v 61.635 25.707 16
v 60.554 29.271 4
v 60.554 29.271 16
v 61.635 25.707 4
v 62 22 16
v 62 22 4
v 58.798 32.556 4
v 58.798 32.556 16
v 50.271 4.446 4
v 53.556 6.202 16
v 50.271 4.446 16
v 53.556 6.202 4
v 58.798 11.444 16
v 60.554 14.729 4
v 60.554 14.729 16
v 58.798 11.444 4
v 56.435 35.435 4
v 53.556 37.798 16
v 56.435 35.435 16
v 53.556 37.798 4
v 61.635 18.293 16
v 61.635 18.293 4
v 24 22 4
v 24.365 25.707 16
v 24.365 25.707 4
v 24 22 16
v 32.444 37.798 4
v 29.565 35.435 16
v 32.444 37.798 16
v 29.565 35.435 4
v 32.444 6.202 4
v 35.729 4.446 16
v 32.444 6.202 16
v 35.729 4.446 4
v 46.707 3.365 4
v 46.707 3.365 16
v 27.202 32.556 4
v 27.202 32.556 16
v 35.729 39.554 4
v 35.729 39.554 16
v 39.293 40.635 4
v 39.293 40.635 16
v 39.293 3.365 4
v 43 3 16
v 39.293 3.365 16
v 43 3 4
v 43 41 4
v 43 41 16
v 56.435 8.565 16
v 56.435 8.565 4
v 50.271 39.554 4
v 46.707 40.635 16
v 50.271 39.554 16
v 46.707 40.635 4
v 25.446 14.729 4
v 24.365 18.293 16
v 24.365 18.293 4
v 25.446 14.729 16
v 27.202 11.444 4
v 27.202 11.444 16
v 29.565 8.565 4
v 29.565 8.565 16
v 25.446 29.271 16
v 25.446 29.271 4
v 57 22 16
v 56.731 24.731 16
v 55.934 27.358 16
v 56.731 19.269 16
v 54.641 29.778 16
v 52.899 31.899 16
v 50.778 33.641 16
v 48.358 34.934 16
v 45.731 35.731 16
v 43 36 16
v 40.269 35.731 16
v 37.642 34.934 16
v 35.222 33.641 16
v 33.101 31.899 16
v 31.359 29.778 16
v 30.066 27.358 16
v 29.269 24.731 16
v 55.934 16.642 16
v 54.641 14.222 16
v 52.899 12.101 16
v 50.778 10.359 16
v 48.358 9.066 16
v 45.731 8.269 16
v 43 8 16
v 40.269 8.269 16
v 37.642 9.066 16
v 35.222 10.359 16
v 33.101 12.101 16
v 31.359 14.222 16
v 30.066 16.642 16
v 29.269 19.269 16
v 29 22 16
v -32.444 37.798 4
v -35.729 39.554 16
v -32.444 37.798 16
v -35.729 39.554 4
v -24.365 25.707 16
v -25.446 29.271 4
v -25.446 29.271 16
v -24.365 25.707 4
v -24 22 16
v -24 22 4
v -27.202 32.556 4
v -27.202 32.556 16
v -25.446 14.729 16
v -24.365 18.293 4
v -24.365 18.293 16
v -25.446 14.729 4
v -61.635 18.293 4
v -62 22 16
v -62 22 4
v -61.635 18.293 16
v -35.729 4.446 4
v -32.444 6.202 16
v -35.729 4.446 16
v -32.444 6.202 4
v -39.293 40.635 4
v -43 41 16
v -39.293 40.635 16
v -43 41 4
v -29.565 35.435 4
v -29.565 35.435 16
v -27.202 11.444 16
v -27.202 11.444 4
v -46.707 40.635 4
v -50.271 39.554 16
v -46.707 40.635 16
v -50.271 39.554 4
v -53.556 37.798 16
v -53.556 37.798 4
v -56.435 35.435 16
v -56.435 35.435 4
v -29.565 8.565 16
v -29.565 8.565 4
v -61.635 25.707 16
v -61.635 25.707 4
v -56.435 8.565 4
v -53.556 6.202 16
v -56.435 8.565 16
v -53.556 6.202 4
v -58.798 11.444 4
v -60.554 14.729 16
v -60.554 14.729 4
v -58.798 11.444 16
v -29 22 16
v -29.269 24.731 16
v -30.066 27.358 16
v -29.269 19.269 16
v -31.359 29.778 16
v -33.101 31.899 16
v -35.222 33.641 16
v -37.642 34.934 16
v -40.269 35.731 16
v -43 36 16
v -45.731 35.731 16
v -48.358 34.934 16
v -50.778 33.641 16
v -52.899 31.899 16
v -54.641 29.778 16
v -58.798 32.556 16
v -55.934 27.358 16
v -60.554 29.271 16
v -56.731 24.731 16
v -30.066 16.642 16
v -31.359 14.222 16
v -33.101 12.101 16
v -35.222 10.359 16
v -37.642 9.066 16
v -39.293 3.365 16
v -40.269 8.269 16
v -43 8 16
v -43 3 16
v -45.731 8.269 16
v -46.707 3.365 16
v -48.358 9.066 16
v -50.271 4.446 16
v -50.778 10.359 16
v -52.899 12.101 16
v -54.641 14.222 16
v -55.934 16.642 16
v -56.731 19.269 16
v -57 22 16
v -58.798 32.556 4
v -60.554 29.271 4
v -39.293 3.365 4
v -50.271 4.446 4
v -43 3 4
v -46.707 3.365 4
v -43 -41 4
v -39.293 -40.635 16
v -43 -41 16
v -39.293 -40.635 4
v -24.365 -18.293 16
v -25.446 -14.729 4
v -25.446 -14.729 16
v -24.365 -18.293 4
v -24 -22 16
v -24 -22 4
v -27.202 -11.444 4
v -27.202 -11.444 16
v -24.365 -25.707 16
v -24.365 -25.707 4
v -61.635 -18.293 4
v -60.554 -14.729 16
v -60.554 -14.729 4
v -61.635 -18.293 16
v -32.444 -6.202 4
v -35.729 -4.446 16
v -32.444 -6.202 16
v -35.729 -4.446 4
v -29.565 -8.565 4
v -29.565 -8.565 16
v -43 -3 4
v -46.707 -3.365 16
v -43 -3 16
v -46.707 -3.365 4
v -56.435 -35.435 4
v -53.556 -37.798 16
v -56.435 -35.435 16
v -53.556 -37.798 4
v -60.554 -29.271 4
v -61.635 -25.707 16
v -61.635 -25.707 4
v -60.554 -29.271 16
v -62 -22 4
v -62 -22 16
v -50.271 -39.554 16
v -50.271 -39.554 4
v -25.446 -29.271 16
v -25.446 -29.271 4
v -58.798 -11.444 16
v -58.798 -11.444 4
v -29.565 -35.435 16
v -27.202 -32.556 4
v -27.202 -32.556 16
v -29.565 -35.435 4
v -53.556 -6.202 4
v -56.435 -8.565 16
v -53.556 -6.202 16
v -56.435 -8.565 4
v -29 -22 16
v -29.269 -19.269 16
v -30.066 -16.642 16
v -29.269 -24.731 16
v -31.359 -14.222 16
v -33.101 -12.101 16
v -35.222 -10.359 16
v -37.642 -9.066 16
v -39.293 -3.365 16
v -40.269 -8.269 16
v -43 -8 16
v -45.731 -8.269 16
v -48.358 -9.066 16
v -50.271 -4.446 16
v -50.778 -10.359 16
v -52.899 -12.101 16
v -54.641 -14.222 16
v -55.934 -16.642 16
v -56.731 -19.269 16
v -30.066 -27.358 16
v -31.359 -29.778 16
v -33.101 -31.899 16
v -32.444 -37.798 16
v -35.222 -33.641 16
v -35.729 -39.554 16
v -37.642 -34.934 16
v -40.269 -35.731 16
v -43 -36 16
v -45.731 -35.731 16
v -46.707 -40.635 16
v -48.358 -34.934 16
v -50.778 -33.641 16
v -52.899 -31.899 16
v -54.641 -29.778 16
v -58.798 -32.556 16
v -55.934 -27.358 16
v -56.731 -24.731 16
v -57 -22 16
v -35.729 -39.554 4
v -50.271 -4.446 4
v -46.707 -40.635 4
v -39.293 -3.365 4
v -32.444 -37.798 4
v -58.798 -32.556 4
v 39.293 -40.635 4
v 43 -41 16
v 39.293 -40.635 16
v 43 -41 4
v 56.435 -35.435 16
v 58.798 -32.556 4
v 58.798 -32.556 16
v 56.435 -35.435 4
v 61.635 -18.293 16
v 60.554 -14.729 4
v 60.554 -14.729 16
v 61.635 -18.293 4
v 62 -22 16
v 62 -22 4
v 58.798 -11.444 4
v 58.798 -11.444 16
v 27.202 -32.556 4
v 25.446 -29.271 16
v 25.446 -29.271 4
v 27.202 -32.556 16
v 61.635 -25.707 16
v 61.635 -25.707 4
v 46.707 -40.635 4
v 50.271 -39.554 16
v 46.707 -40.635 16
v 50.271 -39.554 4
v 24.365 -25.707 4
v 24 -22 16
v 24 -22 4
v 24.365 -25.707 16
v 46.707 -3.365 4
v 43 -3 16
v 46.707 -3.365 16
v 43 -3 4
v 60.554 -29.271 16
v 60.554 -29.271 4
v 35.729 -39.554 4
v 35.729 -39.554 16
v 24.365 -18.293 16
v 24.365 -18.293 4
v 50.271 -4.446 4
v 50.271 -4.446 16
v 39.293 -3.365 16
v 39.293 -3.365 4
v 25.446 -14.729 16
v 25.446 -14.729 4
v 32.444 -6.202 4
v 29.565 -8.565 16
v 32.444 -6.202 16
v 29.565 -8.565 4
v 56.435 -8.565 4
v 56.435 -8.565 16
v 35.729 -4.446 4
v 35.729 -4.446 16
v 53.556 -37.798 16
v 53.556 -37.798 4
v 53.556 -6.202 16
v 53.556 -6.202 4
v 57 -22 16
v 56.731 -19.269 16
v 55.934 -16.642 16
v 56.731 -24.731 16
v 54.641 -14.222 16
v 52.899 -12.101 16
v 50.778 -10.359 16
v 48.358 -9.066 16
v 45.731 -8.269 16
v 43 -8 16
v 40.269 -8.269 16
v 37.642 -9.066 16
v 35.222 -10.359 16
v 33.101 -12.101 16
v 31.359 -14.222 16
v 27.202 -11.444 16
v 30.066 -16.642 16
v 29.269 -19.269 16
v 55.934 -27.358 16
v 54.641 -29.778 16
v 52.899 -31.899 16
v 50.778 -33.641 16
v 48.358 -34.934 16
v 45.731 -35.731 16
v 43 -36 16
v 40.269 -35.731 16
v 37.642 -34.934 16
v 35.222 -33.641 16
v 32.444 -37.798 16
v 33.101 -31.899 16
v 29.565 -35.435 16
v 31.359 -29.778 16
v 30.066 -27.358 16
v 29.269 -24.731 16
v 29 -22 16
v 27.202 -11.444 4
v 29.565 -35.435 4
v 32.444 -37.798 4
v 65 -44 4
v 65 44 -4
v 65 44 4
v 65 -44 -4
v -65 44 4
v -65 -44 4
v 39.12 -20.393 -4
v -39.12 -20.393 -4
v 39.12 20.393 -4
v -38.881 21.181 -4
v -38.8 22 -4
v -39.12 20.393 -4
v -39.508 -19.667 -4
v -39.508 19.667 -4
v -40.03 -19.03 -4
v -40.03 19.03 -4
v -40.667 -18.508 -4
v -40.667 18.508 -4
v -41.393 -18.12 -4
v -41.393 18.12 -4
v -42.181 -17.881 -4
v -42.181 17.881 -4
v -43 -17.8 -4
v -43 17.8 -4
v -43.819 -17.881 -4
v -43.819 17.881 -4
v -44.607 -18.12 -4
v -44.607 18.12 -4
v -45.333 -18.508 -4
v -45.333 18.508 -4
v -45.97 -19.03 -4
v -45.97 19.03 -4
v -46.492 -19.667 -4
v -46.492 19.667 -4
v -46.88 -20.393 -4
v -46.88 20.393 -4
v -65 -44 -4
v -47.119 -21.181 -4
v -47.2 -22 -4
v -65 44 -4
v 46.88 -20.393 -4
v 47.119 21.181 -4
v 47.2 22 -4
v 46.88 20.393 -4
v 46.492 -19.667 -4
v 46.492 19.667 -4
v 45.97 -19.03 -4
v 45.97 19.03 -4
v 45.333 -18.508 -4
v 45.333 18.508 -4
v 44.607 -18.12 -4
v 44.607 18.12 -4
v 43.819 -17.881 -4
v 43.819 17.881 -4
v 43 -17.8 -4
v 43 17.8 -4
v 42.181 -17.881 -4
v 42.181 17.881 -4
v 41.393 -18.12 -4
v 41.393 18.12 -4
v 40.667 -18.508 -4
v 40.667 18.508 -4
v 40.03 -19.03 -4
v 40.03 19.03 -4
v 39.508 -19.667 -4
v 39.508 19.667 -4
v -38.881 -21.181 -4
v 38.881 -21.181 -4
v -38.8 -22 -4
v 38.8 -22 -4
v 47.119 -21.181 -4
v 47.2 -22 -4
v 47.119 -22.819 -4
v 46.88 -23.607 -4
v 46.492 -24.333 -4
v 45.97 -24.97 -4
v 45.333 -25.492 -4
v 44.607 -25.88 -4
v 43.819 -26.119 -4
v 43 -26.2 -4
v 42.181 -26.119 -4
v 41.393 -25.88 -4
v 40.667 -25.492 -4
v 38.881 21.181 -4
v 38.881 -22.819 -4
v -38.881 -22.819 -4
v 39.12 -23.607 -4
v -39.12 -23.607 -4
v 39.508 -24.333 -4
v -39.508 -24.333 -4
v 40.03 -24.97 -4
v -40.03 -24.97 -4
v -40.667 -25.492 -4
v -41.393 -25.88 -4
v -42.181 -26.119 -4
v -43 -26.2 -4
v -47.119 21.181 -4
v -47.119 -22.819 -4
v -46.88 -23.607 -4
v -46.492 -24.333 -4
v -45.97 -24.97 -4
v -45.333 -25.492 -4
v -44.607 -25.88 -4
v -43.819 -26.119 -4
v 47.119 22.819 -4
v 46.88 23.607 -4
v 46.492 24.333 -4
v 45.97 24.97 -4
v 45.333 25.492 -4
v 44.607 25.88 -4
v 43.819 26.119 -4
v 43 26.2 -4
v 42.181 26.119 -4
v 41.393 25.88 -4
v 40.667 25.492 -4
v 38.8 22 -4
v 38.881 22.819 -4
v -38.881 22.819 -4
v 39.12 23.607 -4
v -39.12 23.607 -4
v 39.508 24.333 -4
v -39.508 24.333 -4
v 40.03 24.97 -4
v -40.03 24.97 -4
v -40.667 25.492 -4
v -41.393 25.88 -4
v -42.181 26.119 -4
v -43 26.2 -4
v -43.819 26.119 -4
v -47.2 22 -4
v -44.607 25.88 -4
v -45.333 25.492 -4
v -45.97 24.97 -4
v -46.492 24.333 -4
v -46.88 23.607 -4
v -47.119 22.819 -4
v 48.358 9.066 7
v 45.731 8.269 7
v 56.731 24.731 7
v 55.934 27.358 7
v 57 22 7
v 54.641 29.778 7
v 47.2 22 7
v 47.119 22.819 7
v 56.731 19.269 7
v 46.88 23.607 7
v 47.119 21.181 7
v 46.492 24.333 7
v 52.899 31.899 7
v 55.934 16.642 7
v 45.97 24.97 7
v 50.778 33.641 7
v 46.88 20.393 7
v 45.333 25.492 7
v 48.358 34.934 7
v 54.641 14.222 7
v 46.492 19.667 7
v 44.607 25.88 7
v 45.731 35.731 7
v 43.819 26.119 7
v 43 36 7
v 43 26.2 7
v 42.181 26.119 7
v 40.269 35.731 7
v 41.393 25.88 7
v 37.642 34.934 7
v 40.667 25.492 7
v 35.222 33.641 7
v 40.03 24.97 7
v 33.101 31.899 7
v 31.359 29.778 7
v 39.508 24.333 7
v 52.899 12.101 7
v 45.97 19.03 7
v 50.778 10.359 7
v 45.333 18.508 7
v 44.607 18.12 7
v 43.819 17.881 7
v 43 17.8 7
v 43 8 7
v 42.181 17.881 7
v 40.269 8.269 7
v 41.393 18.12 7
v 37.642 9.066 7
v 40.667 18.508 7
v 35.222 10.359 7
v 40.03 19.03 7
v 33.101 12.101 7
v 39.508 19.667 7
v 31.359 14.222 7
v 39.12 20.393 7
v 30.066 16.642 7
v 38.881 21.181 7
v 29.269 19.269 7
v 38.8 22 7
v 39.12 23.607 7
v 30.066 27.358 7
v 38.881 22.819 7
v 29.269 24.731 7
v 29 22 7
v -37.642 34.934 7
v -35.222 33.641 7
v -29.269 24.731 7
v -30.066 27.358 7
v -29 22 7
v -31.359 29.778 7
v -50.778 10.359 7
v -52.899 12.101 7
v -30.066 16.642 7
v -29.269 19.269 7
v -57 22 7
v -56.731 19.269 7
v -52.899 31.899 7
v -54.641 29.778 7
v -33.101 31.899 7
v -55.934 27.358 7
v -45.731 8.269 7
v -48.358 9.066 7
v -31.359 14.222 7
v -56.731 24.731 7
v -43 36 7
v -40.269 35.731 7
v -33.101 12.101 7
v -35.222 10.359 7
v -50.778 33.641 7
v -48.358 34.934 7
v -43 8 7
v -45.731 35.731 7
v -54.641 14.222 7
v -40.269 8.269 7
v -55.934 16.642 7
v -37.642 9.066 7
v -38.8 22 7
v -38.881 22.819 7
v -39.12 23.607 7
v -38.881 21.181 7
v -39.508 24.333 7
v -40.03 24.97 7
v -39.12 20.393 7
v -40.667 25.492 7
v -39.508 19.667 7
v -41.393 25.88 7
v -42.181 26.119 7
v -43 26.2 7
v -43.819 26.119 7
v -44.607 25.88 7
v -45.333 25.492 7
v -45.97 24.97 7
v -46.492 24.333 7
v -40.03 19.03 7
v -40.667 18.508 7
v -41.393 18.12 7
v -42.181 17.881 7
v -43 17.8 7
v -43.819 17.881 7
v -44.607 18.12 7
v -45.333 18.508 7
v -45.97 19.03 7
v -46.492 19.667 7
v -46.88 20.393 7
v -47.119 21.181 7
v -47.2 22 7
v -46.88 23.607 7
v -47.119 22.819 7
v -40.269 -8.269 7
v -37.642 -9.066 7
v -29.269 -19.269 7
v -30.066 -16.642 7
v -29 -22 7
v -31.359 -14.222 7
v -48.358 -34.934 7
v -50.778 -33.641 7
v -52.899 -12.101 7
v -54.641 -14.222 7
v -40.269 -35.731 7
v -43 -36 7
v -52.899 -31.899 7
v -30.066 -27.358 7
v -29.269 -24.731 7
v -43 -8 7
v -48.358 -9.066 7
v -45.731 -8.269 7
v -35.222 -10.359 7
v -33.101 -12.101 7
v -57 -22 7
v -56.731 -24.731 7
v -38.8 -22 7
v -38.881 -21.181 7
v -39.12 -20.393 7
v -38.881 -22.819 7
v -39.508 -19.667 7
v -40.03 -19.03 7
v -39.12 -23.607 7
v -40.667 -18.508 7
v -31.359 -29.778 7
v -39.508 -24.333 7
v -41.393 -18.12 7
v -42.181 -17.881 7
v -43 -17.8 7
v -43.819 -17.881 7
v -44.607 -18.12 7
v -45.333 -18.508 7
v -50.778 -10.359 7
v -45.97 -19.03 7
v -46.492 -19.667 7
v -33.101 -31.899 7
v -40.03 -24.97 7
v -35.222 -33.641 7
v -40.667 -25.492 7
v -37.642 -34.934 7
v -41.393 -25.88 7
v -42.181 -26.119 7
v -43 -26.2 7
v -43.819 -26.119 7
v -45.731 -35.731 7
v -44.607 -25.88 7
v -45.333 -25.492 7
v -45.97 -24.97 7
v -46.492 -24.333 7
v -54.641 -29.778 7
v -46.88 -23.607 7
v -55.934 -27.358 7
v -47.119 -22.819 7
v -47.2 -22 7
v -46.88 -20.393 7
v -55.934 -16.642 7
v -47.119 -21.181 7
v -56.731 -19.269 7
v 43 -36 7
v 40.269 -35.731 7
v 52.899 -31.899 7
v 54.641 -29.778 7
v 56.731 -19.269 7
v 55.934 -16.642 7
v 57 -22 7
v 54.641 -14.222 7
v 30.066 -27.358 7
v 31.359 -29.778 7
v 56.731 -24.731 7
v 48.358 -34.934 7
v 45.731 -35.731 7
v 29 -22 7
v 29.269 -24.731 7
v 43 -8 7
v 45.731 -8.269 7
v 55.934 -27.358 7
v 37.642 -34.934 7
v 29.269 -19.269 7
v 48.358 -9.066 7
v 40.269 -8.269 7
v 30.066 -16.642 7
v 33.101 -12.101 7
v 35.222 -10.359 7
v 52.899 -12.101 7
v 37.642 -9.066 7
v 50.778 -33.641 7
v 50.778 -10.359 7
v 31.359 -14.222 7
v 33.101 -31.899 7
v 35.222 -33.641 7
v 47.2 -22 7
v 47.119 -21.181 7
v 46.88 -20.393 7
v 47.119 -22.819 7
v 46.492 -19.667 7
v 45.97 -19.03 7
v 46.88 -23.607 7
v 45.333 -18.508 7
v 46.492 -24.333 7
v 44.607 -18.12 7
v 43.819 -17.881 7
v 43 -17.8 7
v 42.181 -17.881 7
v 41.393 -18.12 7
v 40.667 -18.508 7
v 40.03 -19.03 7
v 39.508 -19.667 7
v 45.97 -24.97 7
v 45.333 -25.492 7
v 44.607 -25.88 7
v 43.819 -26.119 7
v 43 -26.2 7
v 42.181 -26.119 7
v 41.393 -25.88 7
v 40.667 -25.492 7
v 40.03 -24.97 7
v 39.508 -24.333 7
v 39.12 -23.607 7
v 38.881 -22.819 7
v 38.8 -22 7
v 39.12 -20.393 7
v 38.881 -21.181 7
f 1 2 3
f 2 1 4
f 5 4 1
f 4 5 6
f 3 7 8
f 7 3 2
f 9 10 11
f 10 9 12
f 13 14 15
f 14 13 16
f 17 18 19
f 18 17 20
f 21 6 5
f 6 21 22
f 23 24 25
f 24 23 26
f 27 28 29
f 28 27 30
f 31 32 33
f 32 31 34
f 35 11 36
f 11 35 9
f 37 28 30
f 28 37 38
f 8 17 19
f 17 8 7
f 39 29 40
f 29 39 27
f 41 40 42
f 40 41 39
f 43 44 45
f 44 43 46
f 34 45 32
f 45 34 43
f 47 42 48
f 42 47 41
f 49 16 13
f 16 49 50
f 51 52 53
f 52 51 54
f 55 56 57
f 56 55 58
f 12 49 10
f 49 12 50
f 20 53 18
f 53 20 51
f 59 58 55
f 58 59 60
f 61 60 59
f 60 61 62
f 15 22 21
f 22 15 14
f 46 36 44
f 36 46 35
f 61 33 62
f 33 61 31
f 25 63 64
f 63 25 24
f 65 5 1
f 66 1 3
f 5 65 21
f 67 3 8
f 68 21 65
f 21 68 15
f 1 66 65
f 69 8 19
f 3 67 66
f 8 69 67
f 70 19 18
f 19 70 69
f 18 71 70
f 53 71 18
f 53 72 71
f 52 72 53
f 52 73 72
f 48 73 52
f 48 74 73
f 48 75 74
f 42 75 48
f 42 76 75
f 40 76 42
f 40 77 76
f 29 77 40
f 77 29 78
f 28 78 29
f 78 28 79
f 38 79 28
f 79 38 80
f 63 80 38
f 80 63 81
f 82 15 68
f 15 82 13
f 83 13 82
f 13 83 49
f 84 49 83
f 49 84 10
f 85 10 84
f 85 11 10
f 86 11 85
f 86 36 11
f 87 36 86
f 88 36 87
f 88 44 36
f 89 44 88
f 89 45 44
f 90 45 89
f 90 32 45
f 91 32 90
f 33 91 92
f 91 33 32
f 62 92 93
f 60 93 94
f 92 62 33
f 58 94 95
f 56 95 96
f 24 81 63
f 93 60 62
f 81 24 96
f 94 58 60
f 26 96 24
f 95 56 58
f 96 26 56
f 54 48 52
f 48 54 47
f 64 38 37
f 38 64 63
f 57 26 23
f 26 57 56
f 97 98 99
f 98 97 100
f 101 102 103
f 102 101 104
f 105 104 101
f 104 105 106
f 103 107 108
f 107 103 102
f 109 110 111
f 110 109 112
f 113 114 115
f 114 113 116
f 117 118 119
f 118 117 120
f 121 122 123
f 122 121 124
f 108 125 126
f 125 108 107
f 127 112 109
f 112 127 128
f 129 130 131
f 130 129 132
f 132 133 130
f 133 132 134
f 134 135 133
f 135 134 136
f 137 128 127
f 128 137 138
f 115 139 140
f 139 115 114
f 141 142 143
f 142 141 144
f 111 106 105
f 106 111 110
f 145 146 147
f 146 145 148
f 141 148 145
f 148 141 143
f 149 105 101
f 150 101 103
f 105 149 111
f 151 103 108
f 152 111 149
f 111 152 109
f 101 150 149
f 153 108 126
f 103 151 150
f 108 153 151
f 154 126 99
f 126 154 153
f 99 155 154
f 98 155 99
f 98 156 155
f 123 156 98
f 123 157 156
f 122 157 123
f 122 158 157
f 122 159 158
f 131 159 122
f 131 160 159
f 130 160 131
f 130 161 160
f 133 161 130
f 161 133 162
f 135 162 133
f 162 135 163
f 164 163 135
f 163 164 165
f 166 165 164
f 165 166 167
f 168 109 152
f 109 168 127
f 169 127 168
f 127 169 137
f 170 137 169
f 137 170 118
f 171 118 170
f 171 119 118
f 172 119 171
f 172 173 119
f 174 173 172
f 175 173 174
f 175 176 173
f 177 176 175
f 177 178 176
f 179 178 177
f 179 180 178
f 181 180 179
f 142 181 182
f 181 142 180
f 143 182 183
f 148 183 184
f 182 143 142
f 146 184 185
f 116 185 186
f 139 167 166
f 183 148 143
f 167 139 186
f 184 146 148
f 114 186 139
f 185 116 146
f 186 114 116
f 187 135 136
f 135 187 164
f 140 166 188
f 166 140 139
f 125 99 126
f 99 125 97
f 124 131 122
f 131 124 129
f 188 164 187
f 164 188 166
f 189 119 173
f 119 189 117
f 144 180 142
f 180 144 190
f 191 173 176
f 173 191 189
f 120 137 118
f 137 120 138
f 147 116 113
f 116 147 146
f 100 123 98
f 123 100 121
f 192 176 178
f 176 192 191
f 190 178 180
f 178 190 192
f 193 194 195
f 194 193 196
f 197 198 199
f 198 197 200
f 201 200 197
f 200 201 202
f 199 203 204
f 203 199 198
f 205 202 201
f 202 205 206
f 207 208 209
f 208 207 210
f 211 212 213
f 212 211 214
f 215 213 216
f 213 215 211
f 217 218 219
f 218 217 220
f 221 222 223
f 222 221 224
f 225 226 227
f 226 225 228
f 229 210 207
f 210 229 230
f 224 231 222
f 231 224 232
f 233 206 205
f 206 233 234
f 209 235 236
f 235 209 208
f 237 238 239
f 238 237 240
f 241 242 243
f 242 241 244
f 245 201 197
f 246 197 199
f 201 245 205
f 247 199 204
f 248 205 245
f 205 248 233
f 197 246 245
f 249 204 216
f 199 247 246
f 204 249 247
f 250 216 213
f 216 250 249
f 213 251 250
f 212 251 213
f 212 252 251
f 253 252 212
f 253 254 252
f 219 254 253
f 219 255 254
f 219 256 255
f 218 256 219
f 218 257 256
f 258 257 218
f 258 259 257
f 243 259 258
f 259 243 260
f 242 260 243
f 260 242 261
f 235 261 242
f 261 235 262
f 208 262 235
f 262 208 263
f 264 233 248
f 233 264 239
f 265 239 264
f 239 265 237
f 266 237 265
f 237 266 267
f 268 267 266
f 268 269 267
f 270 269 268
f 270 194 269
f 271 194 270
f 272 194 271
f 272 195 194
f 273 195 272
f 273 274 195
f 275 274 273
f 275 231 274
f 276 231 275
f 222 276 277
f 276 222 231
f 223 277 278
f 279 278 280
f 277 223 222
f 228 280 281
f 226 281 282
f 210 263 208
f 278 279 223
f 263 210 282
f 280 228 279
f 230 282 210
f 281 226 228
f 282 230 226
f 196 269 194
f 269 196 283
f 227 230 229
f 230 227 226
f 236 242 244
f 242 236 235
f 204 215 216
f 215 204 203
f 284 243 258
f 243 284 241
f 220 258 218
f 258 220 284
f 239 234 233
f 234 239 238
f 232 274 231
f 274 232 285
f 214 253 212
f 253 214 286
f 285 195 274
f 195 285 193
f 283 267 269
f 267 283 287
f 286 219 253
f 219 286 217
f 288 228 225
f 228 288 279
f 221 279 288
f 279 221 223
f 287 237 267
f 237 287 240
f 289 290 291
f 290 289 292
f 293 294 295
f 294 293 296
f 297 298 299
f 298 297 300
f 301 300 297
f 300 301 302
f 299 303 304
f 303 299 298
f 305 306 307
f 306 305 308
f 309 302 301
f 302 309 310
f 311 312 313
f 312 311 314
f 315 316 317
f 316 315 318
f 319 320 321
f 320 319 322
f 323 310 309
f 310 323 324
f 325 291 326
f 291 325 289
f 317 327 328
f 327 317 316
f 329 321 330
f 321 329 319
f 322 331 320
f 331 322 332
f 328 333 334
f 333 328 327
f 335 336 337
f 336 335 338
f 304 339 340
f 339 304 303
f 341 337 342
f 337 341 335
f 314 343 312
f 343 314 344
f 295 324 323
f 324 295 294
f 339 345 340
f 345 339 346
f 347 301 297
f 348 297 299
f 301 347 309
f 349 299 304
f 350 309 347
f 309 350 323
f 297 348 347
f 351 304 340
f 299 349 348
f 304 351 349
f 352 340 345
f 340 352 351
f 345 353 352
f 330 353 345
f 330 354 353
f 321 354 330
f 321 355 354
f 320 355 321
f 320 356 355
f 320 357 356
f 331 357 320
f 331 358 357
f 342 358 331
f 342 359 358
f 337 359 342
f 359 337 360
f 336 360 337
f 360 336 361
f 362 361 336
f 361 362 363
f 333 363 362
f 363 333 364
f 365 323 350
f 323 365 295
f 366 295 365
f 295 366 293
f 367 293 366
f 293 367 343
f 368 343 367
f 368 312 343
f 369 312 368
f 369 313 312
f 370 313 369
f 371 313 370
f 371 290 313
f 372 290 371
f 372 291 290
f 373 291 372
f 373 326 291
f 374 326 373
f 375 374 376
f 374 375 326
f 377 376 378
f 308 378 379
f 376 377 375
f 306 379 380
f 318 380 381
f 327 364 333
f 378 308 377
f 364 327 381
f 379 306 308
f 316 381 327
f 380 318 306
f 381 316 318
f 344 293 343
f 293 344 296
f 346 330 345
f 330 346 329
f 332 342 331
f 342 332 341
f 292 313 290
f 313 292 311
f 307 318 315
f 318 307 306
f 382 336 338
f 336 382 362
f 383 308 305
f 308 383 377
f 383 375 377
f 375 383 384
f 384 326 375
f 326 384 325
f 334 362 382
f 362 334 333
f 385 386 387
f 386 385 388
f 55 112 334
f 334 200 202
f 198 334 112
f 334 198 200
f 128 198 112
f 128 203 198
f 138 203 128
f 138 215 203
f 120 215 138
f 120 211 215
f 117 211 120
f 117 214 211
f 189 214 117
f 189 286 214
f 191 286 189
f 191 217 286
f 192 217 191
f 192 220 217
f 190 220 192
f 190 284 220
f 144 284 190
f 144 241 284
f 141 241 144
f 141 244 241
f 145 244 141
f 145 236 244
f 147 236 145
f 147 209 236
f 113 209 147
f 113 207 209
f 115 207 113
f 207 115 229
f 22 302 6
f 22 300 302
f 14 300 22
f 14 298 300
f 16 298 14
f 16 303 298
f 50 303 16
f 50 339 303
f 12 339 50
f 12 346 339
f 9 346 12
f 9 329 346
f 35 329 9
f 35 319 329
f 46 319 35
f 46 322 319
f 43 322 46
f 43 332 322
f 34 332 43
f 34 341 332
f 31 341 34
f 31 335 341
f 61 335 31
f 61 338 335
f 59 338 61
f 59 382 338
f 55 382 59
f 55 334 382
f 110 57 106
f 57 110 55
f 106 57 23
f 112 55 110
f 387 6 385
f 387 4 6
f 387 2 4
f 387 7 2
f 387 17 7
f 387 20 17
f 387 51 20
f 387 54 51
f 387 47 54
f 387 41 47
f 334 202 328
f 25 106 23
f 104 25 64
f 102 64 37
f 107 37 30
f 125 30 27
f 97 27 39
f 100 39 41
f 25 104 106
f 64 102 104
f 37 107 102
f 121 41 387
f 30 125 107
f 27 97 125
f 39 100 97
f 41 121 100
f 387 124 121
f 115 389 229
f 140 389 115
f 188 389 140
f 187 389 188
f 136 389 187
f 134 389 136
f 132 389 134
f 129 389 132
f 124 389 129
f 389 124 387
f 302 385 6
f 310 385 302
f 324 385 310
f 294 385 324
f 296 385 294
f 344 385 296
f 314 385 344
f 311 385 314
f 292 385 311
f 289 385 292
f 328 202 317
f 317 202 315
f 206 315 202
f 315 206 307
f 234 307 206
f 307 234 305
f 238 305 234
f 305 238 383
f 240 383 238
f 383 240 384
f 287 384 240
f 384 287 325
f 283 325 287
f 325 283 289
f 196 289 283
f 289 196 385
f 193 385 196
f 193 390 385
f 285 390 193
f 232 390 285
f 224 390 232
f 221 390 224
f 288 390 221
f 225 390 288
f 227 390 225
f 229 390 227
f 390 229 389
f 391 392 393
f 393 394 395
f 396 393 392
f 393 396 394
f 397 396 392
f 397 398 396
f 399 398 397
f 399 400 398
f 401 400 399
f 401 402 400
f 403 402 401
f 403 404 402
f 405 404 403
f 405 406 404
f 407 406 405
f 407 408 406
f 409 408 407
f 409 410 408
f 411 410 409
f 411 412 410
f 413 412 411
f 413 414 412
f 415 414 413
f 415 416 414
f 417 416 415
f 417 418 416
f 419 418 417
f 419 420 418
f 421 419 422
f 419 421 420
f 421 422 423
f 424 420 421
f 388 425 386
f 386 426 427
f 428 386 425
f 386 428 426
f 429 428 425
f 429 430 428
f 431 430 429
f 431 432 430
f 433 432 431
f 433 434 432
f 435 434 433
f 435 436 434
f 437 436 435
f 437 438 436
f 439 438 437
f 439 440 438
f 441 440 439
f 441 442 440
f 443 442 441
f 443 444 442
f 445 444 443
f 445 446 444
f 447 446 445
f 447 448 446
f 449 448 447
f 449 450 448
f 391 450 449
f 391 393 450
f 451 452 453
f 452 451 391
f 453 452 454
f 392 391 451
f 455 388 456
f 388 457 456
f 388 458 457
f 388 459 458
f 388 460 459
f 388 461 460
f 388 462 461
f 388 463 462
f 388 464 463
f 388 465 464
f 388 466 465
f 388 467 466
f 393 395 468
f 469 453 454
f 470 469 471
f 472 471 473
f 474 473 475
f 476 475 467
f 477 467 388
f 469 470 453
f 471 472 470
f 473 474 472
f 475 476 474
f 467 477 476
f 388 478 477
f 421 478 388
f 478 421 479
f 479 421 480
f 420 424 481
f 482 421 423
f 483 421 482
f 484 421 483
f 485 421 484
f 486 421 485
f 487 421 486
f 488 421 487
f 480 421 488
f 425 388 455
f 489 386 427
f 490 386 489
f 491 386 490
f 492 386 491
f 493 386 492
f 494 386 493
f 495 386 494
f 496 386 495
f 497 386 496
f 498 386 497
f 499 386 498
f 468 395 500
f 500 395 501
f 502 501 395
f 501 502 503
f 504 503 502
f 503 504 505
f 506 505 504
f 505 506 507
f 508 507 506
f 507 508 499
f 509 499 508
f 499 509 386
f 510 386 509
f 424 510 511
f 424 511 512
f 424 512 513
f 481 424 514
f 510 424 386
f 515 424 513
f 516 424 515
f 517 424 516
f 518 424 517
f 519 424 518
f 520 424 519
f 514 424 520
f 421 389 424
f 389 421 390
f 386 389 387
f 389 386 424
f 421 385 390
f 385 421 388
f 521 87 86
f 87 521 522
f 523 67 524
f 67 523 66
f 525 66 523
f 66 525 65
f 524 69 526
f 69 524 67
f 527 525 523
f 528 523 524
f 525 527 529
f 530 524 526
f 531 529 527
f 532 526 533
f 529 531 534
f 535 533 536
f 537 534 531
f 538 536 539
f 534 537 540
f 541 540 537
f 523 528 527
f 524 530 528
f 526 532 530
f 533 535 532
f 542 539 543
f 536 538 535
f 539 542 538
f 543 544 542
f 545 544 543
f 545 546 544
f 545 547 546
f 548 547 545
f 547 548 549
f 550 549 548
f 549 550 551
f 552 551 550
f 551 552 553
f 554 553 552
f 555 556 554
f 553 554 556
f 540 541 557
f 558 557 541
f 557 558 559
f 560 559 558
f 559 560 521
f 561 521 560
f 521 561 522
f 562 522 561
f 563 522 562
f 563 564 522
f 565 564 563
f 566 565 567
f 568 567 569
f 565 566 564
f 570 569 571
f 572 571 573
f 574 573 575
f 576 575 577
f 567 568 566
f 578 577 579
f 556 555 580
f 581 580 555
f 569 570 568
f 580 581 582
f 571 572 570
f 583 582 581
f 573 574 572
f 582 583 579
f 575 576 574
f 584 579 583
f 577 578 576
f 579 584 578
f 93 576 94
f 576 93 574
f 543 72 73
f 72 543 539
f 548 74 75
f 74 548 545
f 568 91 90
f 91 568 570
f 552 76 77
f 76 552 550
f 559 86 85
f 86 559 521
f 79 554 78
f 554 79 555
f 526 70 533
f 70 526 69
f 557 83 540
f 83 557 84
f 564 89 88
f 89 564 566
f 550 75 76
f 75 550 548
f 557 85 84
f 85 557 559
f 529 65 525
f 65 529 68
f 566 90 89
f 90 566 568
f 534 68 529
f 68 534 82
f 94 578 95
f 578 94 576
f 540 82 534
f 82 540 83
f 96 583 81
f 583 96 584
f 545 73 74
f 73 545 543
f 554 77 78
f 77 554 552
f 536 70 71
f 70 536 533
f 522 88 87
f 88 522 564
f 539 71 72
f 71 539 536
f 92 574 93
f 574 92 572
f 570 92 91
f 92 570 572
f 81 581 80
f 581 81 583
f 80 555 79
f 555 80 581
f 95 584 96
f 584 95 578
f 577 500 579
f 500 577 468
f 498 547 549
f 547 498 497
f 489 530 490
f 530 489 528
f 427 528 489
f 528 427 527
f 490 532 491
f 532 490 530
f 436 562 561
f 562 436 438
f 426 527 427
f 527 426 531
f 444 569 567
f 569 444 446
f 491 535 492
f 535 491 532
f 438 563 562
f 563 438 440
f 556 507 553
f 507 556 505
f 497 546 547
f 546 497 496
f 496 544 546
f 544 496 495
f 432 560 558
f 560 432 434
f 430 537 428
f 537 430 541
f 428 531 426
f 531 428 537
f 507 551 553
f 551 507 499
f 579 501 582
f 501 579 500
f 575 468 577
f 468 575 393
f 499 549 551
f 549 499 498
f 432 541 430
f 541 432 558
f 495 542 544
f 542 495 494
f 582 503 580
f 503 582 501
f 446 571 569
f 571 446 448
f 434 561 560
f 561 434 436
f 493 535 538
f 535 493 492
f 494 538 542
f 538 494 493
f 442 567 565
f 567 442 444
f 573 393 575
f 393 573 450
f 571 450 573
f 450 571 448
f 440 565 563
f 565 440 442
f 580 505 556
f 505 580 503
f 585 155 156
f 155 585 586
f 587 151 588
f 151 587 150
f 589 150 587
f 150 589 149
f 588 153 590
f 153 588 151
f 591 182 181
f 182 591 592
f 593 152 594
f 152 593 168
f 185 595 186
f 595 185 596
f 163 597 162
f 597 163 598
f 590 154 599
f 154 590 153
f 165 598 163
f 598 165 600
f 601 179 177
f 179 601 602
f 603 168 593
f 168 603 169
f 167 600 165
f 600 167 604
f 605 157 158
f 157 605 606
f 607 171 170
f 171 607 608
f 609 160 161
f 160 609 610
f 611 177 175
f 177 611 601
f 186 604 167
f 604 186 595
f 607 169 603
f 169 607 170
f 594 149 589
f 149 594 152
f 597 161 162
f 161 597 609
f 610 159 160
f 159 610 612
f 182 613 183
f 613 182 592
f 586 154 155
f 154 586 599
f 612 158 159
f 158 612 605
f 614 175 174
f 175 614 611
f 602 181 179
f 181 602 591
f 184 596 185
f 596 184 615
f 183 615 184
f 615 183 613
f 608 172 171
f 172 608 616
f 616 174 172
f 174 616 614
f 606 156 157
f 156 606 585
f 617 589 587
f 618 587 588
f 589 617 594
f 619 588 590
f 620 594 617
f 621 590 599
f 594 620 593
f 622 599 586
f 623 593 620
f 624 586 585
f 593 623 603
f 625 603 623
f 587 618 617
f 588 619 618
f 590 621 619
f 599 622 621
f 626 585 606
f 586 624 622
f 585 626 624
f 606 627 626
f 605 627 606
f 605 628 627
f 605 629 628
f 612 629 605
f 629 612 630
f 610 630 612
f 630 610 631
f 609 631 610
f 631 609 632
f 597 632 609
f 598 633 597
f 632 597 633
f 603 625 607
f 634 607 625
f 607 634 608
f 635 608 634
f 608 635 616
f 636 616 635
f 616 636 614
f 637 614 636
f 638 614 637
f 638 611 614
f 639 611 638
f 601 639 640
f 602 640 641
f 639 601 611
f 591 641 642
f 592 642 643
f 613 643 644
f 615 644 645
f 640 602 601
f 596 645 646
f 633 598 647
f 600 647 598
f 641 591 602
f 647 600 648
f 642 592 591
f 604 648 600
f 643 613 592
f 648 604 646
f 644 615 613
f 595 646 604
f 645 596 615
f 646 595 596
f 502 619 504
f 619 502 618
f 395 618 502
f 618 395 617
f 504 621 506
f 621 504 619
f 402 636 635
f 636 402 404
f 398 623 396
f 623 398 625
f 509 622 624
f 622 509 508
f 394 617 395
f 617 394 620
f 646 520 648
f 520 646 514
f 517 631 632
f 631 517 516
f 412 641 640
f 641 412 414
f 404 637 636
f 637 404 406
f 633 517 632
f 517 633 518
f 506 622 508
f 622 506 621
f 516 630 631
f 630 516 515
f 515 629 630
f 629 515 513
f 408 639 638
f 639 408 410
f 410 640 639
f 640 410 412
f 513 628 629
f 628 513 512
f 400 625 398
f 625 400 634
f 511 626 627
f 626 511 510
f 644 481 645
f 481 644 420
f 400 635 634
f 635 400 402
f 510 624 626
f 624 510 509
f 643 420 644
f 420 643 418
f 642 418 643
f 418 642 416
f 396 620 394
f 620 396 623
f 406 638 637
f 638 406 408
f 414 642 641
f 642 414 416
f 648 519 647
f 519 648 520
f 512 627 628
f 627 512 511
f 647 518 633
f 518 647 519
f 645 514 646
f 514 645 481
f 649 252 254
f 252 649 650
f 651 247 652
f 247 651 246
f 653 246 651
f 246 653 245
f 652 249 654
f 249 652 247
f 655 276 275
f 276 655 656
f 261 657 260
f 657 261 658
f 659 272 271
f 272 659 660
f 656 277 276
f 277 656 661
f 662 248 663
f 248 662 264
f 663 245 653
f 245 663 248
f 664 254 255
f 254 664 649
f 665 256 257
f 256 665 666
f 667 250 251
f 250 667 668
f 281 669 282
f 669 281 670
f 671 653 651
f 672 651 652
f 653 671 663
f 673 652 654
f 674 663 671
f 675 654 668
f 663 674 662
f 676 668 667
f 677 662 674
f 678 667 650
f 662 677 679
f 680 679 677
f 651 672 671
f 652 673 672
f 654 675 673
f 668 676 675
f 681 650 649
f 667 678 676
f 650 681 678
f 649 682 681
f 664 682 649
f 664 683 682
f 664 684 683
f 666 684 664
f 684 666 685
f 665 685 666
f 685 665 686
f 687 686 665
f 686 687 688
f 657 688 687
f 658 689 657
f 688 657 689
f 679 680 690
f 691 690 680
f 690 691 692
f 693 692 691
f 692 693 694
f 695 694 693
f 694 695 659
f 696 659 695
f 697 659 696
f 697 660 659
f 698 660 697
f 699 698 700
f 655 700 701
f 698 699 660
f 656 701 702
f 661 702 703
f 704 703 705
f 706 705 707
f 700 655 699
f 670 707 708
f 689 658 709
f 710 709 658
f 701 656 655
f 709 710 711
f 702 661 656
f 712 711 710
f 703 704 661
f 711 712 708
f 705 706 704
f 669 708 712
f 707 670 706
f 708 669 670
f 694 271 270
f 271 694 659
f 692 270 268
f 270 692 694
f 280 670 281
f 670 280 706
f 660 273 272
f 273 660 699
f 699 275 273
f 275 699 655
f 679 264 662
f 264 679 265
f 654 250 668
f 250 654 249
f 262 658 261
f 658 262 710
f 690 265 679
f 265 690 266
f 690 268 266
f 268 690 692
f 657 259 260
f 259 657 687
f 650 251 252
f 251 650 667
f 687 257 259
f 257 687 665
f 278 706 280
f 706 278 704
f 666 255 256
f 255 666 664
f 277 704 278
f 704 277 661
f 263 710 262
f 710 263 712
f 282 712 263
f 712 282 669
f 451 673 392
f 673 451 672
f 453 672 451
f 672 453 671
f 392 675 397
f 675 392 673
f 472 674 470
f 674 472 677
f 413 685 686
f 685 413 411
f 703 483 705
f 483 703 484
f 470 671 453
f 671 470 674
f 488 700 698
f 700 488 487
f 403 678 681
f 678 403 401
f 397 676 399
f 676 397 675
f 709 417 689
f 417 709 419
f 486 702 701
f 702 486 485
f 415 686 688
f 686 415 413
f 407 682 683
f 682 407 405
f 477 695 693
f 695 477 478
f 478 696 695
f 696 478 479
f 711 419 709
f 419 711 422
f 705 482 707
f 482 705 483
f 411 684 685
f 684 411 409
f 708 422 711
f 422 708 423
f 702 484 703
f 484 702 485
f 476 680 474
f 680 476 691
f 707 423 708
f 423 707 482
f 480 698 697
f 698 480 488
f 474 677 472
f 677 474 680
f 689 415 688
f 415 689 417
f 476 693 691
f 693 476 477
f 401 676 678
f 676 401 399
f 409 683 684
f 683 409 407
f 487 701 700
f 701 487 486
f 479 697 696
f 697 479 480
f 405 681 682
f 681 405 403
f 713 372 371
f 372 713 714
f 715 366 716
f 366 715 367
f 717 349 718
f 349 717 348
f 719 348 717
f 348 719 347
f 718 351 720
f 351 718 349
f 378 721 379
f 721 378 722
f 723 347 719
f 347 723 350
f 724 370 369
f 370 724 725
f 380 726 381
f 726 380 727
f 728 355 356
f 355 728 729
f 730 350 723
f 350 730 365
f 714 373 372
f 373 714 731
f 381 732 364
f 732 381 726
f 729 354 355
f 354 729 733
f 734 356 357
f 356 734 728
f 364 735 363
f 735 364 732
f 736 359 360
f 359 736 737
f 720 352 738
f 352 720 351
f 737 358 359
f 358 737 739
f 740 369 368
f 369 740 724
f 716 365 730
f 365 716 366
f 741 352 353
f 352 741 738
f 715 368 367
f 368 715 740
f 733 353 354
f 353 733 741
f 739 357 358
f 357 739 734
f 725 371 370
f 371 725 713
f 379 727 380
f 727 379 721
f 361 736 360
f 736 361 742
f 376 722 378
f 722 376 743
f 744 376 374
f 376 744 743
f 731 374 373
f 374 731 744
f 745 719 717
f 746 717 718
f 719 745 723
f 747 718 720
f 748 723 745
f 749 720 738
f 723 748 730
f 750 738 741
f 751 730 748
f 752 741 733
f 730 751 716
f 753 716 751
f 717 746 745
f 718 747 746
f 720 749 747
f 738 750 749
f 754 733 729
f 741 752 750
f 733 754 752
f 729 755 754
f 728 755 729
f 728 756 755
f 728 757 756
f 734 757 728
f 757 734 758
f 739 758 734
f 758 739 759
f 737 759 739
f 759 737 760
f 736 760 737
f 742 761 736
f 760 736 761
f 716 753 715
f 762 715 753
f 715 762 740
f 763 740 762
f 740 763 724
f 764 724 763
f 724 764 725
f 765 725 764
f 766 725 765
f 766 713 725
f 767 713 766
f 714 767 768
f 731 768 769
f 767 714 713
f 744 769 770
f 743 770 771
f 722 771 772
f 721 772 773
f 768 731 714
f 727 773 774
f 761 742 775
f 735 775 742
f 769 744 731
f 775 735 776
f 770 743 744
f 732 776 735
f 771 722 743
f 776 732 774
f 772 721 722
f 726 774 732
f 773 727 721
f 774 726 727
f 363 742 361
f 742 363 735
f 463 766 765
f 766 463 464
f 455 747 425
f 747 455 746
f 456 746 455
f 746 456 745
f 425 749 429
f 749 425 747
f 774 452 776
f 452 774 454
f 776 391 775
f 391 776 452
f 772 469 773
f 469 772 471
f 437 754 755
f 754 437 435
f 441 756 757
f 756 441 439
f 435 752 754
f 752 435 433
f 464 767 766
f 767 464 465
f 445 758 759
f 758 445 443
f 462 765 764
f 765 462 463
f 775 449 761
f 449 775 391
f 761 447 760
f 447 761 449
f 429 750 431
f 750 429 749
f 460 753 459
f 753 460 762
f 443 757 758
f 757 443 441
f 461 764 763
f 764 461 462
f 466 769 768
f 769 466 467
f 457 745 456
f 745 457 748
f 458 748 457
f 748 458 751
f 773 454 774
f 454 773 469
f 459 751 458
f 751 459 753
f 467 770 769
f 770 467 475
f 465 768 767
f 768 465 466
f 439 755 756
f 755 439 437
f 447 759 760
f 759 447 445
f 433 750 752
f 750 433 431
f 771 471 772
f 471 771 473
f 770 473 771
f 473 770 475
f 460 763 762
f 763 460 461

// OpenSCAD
$fn = 32;

// ----------------------------------------------------------------------
// Socket pad plate
// bosses with counterbored sockets for the screws
// ----------------------------------------------------------------------

// --- parameters (mm) ---
base_t = 8;            // base plate thickness
boss_h = 12;           // boss height above the base plate
boss_d = 38;           // boss diameter
socket_d = 28;         // socket diameter
socket_depth = 9;      // socket depth from the boss face
bolt_d = 8.4;          // screw clearance hole through the socket floor
plate = [130, 88, 8];  // overall size (x, y, z)
edge = 22;             // boss centre offset from the plate edge
pads = 4;              // boss count, one per corner

// --- derived feature positions (mm) ---
height = base_t + boss_h;        // = 20   overall height of the part
corner_x = plate[0] / 2 - edge;  // = 43   boss centre X
corner_y = plate[1] / 2 - edge;  // = 22   boss centre Y
feature_centers = [
  [corner_x, corner_y],
  [-corner_x, corner_y],
  [-corner_x, -corner_y],
  [corner_x, -corner_y]
];   // boss centres: sockets, holes and the pads themselves are placed from here

// base plate, bosses on feature_centers, socket + through hole in each
difference() {
  union() {
    cube(plate, center = true);
    for (centre = feature_centers)
      translate([centre[0], centre[1], plate[2] / 2 - 1])
        cylinder(d = boss_d, h = boss_h + 1);
  }
  for (centre = feature_centers) {
    translate([centre[0], centre[1], plate[2] / 2 + boss_h - socket_depth])
      cylinder(d = socket_d, h = socket_depth + 1);
    translate([centre[0], centre[1], -height])
      cylinder(d = bolt_d, h = 2 * height + 2);  // through the socket floor
  }
}
